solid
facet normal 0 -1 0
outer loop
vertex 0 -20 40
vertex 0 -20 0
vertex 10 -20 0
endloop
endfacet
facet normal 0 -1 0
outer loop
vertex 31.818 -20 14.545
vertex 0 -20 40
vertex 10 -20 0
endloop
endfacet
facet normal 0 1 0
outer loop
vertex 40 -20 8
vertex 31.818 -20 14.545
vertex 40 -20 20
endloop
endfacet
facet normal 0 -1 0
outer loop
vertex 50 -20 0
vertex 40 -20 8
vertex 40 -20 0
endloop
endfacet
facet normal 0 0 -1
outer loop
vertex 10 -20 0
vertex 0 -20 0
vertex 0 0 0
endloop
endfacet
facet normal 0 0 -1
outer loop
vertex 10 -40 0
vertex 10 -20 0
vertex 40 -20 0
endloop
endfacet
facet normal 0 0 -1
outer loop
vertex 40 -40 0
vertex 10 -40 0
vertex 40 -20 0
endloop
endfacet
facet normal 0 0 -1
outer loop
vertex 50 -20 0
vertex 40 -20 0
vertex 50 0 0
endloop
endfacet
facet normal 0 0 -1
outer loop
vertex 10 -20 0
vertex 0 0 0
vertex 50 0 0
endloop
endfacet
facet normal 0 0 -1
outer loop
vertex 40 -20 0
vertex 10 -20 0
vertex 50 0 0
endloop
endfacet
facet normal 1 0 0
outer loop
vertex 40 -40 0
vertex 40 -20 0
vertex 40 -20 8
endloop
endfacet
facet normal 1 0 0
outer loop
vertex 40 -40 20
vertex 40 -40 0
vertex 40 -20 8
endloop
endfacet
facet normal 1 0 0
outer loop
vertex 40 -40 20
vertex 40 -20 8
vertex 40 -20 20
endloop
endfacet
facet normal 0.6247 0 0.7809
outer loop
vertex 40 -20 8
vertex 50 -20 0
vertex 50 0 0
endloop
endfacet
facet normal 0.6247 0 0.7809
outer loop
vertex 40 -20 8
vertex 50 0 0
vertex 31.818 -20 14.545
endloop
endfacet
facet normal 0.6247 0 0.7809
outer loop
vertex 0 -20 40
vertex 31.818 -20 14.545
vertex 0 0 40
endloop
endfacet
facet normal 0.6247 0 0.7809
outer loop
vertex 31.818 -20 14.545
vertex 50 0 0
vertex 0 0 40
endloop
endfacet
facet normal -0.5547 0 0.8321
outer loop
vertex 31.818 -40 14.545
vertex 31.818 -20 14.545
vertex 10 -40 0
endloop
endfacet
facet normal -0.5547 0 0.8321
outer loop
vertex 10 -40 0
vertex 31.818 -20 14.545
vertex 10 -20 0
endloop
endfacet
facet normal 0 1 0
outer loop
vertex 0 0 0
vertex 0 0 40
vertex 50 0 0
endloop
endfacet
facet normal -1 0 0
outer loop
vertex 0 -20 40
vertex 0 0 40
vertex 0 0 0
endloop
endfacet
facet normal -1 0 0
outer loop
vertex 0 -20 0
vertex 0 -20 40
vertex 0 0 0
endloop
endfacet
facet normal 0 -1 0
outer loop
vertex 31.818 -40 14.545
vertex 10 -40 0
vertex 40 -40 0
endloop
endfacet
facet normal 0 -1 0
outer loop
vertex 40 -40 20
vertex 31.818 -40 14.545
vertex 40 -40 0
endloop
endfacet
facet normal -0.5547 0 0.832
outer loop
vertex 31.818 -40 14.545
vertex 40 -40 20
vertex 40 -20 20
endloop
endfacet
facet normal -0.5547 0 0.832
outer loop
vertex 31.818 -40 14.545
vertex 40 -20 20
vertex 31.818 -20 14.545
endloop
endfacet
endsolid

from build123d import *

# Parameters (mm, degrees)
F1_DEPTH = 20
F3_DEPTH = 20


with BuildPart() as f1:
    # F0 (on Front) → F1 (new body)
    with BuildSketch(Plane.XZ):
        Polygon((0, 40), (0, 0), (50, 0), align=None)
    extrude(amount=F1_DEPTH)

    # F2 (on face) → F3 (join)
    with BuildSketch(Plane.XZ.offset(20)):
        Polygon((31.8181818182, 14.5454545455), (10, 0), (40, 0), (40, 8), align=None)
        Polygon((40, 20), (31.8181818182, 14.5454545455), (40, 8), align=None)
    extrude(amount=F3_DEPTH)


solid = f1.part
